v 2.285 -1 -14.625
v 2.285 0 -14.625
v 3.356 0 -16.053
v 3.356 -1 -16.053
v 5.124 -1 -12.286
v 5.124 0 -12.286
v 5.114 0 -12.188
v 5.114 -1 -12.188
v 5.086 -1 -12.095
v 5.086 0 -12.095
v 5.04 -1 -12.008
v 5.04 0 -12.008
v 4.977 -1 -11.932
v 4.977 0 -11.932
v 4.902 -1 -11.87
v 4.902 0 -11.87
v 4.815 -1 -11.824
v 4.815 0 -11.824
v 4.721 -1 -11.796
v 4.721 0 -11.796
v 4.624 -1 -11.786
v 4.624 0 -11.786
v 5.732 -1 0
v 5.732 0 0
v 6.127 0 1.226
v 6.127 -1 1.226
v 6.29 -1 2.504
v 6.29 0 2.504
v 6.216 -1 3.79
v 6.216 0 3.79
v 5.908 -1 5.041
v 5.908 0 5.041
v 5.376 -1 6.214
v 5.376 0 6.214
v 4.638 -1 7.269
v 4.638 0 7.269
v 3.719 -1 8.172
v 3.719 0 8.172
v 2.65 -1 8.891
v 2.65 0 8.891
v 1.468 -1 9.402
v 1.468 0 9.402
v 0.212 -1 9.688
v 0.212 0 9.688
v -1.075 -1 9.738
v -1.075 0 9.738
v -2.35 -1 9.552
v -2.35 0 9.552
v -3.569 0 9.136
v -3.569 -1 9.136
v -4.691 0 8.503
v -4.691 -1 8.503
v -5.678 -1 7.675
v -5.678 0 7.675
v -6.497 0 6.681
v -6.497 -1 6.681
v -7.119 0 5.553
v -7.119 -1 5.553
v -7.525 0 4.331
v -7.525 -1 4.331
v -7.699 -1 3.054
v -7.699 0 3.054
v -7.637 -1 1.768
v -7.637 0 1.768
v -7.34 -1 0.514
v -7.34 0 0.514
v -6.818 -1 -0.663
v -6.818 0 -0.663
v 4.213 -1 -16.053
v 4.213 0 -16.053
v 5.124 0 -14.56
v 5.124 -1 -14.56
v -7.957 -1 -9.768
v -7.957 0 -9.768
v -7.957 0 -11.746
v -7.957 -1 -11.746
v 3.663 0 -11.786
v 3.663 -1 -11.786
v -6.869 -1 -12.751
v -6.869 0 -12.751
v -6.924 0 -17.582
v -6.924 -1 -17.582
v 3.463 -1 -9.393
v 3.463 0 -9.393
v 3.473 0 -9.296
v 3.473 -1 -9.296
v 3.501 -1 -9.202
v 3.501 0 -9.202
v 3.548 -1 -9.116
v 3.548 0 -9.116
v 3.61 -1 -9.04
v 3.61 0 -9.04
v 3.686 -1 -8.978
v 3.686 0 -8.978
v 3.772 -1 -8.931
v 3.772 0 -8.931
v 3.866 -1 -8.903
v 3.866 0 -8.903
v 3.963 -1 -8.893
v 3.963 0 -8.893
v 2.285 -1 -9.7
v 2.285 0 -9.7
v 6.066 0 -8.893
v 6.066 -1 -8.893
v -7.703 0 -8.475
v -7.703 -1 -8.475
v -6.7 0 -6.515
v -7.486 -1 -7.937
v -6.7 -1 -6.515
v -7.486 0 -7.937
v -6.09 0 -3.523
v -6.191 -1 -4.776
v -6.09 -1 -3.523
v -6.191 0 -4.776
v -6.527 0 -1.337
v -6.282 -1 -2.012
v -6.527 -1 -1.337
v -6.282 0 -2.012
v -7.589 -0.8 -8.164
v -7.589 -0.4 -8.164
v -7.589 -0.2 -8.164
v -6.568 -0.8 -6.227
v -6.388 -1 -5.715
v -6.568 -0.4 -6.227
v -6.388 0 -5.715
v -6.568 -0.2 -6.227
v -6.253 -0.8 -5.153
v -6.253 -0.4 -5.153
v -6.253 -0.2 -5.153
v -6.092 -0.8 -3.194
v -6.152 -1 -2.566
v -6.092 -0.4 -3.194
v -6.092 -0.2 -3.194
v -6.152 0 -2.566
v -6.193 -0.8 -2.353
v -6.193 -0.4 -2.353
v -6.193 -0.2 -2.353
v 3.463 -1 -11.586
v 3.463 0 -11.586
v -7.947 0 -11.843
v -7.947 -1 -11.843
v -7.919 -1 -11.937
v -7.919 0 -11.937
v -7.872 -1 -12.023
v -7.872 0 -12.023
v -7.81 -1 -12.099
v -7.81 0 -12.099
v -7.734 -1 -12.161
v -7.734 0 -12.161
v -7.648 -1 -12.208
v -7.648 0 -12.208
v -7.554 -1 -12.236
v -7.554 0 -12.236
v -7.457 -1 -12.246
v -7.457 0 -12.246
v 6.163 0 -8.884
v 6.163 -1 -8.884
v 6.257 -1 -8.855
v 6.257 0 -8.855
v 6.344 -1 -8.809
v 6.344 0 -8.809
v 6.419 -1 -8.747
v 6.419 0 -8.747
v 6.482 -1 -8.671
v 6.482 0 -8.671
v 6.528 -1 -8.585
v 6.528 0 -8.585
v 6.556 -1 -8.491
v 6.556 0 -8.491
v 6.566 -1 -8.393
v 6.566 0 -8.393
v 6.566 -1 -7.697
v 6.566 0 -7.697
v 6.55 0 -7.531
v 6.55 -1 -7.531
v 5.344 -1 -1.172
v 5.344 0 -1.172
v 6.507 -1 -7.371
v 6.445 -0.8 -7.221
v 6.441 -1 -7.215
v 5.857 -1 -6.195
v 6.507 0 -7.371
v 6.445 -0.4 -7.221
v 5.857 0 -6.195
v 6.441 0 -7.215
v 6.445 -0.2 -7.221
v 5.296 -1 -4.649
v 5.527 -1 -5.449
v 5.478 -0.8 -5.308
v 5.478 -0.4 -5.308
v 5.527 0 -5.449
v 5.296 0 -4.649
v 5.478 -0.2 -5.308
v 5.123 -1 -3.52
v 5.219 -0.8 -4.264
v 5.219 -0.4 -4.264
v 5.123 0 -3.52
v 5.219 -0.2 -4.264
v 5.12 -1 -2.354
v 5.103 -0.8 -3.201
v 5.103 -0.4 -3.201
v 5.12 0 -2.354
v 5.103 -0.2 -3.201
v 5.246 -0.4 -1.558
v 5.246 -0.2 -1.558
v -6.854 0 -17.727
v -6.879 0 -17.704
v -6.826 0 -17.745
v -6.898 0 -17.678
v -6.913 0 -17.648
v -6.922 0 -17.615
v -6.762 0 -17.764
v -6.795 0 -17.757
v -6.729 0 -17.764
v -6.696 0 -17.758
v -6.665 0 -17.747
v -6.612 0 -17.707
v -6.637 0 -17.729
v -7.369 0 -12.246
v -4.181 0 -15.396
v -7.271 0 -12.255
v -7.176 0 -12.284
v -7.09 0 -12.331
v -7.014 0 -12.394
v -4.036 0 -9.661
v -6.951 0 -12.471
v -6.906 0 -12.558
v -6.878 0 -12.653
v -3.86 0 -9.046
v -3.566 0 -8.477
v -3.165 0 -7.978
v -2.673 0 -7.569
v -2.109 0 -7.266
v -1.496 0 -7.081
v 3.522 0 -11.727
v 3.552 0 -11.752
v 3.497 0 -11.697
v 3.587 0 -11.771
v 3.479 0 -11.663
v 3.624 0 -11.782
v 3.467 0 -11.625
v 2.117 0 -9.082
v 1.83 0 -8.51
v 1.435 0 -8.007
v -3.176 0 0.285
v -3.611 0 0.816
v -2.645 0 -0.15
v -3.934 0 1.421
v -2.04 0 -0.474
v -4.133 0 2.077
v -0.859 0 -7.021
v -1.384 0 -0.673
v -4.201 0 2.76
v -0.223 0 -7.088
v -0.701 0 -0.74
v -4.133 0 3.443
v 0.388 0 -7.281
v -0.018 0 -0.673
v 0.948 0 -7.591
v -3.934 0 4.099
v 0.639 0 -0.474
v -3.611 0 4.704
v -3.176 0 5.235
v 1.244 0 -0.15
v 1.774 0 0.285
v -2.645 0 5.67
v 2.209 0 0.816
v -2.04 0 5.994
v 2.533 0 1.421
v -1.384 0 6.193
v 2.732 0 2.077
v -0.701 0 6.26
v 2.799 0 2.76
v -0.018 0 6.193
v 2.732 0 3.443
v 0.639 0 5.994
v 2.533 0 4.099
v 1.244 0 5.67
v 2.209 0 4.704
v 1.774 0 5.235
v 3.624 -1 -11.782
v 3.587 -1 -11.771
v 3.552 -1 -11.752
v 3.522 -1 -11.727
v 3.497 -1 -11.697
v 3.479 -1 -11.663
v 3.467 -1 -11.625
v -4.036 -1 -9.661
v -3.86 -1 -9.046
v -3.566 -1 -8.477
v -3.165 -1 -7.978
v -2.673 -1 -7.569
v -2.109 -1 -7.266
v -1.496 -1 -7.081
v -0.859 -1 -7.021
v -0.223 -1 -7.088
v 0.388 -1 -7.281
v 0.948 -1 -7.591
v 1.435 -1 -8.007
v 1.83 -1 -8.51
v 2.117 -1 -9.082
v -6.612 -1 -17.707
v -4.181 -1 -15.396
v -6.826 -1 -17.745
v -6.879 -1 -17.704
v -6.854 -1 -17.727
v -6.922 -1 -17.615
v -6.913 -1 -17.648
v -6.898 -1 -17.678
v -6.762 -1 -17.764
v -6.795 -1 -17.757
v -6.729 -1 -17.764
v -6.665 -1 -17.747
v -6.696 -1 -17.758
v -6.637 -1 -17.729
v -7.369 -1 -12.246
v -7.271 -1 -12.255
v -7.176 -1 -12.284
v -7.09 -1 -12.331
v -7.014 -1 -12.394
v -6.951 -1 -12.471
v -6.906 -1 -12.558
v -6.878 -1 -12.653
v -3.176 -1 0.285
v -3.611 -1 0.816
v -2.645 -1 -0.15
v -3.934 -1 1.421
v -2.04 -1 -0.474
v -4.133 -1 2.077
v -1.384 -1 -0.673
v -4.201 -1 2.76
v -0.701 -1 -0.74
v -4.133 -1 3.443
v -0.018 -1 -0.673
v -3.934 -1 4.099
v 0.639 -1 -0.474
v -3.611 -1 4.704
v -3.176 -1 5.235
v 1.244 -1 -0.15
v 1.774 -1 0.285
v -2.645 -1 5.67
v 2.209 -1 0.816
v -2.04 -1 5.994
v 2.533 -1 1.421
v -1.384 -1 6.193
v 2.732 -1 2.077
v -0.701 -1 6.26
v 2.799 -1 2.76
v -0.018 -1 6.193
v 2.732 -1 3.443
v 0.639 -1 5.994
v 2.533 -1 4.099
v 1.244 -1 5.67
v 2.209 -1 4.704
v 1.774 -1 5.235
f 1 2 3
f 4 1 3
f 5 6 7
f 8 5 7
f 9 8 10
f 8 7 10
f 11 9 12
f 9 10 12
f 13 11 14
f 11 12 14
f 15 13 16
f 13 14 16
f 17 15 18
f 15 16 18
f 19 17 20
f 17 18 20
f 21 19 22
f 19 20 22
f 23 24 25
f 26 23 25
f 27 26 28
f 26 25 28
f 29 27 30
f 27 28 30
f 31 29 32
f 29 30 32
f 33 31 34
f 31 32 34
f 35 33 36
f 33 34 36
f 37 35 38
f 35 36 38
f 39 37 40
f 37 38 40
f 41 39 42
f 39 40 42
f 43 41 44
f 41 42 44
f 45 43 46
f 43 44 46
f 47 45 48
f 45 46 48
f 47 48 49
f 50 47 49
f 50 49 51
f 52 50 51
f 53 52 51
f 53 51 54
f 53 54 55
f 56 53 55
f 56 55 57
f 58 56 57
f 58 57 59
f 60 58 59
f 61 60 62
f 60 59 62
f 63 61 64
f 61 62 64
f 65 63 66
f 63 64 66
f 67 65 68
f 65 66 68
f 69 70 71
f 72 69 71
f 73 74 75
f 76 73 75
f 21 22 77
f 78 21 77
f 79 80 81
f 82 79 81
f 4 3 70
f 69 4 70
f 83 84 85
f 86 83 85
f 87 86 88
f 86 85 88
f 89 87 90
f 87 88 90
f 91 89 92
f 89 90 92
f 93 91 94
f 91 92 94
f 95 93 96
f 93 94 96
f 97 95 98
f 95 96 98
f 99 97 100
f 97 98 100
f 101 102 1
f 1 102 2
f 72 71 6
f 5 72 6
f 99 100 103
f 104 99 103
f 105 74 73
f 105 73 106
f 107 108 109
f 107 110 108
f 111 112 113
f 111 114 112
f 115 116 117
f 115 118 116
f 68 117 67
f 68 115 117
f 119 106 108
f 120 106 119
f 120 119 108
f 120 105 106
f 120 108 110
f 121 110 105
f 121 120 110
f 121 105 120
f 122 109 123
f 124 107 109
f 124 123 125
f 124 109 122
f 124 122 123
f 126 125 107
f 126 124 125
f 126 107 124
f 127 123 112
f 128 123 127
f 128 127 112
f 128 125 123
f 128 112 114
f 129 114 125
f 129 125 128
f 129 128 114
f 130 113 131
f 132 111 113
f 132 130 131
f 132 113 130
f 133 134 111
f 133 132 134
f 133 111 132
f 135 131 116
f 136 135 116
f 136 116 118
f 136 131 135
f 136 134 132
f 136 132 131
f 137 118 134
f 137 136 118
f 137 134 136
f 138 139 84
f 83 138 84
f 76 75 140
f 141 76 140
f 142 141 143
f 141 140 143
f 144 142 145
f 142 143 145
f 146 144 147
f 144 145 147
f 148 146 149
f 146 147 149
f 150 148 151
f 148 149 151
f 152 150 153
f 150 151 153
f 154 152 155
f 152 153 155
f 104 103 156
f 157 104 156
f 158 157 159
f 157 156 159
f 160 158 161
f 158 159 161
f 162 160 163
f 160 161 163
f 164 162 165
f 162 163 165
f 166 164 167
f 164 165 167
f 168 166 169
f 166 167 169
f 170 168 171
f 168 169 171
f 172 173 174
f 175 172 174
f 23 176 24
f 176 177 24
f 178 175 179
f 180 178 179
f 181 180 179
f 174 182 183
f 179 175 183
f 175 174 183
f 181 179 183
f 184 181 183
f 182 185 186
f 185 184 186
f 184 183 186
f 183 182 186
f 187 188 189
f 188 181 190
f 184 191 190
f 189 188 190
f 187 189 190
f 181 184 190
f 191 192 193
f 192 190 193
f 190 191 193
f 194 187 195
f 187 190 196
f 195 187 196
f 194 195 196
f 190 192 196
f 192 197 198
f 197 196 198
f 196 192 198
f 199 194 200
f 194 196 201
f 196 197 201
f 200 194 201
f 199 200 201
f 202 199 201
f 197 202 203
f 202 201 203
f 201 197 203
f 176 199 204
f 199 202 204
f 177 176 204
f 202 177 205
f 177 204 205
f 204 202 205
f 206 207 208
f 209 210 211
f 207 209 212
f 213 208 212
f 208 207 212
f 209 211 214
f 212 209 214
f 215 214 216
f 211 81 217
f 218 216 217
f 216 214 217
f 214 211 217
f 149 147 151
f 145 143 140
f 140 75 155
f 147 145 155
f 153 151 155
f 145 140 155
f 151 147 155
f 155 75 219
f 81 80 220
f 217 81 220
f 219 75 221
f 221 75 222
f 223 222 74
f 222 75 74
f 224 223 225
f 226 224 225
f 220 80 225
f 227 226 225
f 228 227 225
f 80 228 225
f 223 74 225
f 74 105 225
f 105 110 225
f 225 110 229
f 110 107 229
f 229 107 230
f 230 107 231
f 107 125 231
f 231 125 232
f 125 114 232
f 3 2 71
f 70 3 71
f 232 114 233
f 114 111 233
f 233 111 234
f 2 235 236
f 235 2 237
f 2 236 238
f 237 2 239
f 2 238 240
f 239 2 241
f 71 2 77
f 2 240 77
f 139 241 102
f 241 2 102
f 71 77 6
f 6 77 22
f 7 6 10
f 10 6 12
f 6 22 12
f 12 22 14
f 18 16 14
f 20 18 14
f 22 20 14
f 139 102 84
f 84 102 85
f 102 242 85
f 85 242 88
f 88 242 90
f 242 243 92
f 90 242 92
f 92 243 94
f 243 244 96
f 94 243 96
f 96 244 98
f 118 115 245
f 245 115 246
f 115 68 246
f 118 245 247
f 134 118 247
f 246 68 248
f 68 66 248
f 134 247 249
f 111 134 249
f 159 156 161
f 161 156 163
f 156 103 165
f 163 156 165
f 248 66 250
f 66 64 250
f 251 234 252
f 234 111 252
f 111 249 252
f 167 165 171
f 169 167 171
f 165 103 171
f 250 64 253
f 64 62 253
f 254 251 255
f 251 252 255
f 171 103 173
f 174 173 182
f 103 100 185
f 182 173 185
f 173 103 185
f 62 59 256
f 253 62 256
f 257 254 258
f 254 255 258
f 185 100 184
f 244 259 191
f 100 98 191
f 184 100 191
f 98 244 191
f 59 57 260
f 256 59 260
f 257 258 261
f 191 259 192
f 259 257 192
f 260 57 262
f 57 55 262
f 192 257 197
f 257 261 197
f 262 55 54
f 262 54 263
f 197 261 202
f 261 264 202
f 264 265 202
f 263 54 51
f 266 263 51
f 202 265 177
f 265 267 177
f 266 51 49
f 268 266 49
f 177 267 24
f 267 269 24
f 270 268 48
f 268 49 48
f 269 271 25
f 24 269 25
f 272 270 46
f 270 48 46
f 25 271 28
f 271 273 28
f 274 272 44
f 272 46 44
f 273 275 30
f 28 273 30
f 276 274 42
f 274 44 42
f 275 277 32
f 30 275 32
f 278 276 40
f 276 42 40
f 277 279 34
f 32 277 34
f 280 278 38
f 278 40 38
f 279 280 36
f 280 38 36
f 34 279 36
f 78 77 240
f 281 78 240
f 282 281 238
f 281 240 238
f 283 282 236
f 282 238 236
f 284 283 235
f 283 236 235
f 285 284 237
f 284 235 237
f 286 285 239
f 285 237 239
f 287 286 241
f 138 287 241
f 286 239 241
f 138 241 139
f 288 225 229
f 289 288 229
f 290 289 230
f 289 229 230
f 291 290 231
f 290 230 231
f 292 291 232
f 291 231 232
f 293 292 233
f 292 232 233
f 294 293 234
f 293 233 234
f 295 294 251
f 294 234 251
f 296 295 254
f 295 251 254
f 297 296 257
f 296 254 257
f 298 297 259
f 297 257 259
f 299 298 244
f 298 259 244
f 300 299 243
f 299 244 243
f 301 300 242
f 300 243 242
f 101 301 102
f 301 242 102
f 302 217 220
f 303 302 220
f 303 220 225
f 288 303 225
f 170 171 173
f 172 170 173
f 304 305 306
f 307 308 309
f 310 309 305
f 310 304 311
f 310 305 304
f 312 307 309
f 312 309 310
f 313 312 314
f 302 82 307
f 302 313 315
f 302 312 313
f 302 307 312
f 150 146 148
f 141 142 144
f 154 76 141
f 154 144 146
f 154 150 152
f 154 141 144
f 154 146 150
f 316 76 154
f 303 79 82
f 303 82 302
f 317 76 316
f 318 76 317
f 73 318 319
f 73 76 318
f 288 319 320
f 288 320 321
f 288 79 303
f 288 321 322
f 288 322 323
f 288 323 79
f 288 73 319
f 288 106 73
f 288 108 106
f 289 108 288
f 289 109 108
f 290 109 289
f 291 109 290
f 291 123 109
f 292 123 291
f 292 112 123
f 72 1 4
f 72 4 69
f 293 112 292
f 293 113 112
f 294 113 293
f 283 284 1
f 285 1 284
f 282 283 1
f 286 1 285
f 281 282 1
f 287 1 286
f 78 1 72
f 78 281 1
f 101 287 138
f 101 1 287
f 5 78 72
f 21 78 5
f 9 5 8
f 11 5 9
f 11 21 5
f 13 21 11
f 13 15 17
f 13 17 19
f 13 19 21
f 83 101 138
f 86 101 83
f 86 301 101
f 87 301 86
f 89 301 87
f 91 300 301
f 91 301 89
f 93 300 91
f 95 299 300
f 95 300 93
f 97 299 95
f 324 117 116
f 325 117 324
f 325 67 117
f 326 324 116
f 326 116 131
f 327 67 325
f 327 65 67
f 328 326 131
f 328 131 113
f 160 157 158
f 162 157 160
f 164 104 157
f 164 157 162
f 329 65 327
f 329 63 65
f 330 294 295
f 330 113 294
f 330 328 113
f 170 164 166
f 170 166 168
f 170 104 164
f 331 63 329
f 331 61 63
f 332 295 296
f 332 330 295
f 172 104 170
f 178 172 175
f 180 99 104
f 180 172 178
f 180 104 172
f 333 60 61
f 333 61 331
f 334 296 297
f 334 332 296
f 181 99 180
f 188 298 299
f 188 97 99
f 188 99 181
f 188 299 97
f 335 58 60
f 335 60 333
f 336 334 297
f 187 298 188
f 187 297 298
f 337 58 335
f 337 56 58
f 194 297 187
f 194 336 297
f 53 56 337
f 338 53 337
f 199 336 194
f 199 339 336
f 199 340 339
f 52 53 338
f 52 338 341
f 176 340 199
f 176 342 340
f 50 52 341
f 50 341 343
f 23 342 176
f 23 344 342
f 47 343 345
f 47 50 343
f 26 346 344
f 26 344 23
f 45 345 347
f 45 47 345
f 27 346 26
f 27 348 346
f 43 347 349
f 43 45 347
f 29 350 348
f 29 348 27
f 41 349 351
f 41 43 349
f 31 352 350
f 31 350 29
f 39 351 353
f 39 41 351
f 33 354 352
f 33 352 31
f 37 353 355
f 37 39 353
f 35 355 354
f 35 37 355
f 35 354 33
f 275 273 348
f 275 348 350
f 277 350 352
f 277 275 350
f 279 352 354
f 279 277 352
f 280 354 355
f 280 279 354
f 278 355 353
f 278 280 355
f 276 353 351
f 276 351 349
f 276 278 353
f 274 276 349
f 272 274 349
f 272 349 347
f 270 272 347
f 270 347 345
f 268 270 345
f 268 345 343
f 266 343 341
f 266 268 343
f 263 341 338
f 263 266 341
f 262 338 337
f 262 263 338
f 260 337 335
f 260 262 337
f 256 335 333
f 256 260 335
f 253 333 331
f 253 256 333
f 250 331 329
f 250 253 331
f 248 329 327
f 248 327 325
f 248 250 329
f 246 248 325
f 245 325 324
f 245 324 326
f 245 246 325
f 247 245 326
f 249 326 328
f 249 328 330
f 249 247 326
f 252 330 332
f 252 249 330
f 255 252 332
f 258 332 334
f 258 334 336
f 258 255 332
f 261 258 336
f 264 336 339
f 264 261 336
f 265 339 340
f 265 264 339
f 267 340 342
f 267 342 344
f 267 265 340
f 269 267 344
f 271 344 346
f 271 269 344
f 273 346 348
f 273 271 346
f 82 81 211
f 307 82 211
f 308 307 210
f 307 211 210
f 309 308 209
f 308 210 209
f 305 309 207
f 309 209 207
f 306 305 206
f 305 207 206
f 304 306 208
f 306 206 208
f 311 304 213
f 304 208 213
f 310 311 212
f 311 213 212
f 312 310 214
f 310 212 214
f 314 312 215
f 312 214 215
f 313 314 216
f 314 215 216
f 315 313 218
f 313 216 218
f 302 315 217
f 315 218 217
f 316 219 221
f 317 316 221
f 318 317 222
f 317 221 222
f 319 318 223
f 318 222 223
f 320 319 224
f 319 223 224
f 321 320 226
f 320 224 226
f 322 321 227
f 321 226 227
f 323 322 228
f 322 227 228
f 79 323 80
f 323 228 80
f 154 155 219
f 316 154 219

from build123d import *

# Parameters (mm, degrees)
F0_R     = 3.5
F1_DEPTH = 1


with BuildPart() as f1:
    # F0 (on Front) → F1 (new body)
    with BuildSketch(Plane.XZ):
        with BuildLine():
            Line((-6.6117709503, -17.7072025836), (-4.180541262, -15.3958080336))
            Line((-4.180541262, -15.3958080336), (-4.0357941762, -9.6612172201))
            ThreePointArc((-4.0357941762, -9.6612172201), (-0.8592229863, -7.0206183808), (2.2847101224, -9.6999935621))
            Line((2.2847101224, -9.6999935621), (2.2847101224, -14.6249644458))
            Line((2.2847101224, -14.6249644458), (3.3562604804, -16.0533804446))
            Line((3.3562604804, -16.0533804446), (4.2133103125, -16.0533804446))
            Line((4.2133103125, -16.0533804446), (5.123925861, -14.5599710971))
            Line((5.123925861, -14.5599710971), (5.123925861, -12.2859868333))
            ThreePointArc((5.123925861, -12.2859868333), (4.9774792516, -11.9324334427), (4.623925861, -11.7859868333))
            Line((4.623925861, -11.7859868333), (3.6633914474, -11.7859868333))
            ThreePointArc((3.6633914474, -11.7859868333), (3.5219700912, -11.7274081895), (3.4633914474, -11.5859868333))
            Line((3.4633914474, -11.5859868333), (3.4633914474, -9.3933893368))
            ThreePointArc((3.4633914474, -9.3933893368), (3.6098380568, -9.0398359462), (3.9633914474, -8.8933893368))
            Line((3.9633914474, -8.8933893368), (6.0659102777, -8.8933893368))
            ThreePointArc((6.0659102777, -8.8933893368), (6.4194636683, -8.7469427274), (6.5659102777, -8.3933893368))
            Line((6.5659102777, -8.3933893368), (6.5659102777, -7.6971449889))
            add(Edge.make_bspline(
                [(6.5659102777, -7.6971449889), (6.5659102777, -7.3604537174), (6.1308538816, -6.7250376157), (5.3694360763, -5.3256448251), (5.0200880103, -3.2005265741), (5.1779062539, -1.5597114412), (5.5472315899, -0.5191652161), (5.7321804401, 0)],
                knots=[0, 0, 0, 0, 0.1603623278, 0.3613989356, 0.5935239119, 0.7972784215, 1, 1, 1, 1], degree=3))
            ThreePointArc((5.7321804401, 0), (-1.0752950501, 9.7383416681), (-6.8182754475, -0.663350365))
            add(Edge.make_bspline(
                [(-7.9565616325, -9.7683481872), (-7.8795153177, -9.2354358822), (-7.7383664617, -8.0850617885), (-6.3860842213, -6.2946925646), (-6.072886576, -4.0949884517), (-6.0697572799, -2.3374053261), (-6.5696365594, -1.2250004752), (-6.8182754475, -0.663350365)],
                knots=[0, 0, 0, 0, 0.1859272011, 0.4003477057, 0.6149796646, 0.8054836062, 1, 1, 1, 1], degree=3))
            Line((-7.9565616325, -9.7683481872), (-7.9565616325, -11.7456736863))
            ThreePointArc((-7.9565616325, -11.7456736863), (-7.810115023, -12.0992270769), (-7.4565616325, -12.2456736863))
            Line((-7.4565616325, -12.2456736863), (-7.3690715705, -12.2456736863))
            ThreePointArc((-7.3690715705, -12.2456736863), (-7.0135065314, -12.3941434558), (-6.8691041299, -12.7513796745))
            Line((-6.8691041299, -12.7513796745), (-6.9242371246, -17.5822172314))
            ThreePointArc((-6.9242371246, -17.5822172314), (-6.8108358449, -17.7517903835), (-6.6117709503, -17.7072025836))
        make_face()
        with Locations((-0.7007342175, 2.7600016318)):
            Circle(F0_R, mode=Mode.SUBTRACT)
    extrude(amount=F1_DEPTH)


solid = f1.part
